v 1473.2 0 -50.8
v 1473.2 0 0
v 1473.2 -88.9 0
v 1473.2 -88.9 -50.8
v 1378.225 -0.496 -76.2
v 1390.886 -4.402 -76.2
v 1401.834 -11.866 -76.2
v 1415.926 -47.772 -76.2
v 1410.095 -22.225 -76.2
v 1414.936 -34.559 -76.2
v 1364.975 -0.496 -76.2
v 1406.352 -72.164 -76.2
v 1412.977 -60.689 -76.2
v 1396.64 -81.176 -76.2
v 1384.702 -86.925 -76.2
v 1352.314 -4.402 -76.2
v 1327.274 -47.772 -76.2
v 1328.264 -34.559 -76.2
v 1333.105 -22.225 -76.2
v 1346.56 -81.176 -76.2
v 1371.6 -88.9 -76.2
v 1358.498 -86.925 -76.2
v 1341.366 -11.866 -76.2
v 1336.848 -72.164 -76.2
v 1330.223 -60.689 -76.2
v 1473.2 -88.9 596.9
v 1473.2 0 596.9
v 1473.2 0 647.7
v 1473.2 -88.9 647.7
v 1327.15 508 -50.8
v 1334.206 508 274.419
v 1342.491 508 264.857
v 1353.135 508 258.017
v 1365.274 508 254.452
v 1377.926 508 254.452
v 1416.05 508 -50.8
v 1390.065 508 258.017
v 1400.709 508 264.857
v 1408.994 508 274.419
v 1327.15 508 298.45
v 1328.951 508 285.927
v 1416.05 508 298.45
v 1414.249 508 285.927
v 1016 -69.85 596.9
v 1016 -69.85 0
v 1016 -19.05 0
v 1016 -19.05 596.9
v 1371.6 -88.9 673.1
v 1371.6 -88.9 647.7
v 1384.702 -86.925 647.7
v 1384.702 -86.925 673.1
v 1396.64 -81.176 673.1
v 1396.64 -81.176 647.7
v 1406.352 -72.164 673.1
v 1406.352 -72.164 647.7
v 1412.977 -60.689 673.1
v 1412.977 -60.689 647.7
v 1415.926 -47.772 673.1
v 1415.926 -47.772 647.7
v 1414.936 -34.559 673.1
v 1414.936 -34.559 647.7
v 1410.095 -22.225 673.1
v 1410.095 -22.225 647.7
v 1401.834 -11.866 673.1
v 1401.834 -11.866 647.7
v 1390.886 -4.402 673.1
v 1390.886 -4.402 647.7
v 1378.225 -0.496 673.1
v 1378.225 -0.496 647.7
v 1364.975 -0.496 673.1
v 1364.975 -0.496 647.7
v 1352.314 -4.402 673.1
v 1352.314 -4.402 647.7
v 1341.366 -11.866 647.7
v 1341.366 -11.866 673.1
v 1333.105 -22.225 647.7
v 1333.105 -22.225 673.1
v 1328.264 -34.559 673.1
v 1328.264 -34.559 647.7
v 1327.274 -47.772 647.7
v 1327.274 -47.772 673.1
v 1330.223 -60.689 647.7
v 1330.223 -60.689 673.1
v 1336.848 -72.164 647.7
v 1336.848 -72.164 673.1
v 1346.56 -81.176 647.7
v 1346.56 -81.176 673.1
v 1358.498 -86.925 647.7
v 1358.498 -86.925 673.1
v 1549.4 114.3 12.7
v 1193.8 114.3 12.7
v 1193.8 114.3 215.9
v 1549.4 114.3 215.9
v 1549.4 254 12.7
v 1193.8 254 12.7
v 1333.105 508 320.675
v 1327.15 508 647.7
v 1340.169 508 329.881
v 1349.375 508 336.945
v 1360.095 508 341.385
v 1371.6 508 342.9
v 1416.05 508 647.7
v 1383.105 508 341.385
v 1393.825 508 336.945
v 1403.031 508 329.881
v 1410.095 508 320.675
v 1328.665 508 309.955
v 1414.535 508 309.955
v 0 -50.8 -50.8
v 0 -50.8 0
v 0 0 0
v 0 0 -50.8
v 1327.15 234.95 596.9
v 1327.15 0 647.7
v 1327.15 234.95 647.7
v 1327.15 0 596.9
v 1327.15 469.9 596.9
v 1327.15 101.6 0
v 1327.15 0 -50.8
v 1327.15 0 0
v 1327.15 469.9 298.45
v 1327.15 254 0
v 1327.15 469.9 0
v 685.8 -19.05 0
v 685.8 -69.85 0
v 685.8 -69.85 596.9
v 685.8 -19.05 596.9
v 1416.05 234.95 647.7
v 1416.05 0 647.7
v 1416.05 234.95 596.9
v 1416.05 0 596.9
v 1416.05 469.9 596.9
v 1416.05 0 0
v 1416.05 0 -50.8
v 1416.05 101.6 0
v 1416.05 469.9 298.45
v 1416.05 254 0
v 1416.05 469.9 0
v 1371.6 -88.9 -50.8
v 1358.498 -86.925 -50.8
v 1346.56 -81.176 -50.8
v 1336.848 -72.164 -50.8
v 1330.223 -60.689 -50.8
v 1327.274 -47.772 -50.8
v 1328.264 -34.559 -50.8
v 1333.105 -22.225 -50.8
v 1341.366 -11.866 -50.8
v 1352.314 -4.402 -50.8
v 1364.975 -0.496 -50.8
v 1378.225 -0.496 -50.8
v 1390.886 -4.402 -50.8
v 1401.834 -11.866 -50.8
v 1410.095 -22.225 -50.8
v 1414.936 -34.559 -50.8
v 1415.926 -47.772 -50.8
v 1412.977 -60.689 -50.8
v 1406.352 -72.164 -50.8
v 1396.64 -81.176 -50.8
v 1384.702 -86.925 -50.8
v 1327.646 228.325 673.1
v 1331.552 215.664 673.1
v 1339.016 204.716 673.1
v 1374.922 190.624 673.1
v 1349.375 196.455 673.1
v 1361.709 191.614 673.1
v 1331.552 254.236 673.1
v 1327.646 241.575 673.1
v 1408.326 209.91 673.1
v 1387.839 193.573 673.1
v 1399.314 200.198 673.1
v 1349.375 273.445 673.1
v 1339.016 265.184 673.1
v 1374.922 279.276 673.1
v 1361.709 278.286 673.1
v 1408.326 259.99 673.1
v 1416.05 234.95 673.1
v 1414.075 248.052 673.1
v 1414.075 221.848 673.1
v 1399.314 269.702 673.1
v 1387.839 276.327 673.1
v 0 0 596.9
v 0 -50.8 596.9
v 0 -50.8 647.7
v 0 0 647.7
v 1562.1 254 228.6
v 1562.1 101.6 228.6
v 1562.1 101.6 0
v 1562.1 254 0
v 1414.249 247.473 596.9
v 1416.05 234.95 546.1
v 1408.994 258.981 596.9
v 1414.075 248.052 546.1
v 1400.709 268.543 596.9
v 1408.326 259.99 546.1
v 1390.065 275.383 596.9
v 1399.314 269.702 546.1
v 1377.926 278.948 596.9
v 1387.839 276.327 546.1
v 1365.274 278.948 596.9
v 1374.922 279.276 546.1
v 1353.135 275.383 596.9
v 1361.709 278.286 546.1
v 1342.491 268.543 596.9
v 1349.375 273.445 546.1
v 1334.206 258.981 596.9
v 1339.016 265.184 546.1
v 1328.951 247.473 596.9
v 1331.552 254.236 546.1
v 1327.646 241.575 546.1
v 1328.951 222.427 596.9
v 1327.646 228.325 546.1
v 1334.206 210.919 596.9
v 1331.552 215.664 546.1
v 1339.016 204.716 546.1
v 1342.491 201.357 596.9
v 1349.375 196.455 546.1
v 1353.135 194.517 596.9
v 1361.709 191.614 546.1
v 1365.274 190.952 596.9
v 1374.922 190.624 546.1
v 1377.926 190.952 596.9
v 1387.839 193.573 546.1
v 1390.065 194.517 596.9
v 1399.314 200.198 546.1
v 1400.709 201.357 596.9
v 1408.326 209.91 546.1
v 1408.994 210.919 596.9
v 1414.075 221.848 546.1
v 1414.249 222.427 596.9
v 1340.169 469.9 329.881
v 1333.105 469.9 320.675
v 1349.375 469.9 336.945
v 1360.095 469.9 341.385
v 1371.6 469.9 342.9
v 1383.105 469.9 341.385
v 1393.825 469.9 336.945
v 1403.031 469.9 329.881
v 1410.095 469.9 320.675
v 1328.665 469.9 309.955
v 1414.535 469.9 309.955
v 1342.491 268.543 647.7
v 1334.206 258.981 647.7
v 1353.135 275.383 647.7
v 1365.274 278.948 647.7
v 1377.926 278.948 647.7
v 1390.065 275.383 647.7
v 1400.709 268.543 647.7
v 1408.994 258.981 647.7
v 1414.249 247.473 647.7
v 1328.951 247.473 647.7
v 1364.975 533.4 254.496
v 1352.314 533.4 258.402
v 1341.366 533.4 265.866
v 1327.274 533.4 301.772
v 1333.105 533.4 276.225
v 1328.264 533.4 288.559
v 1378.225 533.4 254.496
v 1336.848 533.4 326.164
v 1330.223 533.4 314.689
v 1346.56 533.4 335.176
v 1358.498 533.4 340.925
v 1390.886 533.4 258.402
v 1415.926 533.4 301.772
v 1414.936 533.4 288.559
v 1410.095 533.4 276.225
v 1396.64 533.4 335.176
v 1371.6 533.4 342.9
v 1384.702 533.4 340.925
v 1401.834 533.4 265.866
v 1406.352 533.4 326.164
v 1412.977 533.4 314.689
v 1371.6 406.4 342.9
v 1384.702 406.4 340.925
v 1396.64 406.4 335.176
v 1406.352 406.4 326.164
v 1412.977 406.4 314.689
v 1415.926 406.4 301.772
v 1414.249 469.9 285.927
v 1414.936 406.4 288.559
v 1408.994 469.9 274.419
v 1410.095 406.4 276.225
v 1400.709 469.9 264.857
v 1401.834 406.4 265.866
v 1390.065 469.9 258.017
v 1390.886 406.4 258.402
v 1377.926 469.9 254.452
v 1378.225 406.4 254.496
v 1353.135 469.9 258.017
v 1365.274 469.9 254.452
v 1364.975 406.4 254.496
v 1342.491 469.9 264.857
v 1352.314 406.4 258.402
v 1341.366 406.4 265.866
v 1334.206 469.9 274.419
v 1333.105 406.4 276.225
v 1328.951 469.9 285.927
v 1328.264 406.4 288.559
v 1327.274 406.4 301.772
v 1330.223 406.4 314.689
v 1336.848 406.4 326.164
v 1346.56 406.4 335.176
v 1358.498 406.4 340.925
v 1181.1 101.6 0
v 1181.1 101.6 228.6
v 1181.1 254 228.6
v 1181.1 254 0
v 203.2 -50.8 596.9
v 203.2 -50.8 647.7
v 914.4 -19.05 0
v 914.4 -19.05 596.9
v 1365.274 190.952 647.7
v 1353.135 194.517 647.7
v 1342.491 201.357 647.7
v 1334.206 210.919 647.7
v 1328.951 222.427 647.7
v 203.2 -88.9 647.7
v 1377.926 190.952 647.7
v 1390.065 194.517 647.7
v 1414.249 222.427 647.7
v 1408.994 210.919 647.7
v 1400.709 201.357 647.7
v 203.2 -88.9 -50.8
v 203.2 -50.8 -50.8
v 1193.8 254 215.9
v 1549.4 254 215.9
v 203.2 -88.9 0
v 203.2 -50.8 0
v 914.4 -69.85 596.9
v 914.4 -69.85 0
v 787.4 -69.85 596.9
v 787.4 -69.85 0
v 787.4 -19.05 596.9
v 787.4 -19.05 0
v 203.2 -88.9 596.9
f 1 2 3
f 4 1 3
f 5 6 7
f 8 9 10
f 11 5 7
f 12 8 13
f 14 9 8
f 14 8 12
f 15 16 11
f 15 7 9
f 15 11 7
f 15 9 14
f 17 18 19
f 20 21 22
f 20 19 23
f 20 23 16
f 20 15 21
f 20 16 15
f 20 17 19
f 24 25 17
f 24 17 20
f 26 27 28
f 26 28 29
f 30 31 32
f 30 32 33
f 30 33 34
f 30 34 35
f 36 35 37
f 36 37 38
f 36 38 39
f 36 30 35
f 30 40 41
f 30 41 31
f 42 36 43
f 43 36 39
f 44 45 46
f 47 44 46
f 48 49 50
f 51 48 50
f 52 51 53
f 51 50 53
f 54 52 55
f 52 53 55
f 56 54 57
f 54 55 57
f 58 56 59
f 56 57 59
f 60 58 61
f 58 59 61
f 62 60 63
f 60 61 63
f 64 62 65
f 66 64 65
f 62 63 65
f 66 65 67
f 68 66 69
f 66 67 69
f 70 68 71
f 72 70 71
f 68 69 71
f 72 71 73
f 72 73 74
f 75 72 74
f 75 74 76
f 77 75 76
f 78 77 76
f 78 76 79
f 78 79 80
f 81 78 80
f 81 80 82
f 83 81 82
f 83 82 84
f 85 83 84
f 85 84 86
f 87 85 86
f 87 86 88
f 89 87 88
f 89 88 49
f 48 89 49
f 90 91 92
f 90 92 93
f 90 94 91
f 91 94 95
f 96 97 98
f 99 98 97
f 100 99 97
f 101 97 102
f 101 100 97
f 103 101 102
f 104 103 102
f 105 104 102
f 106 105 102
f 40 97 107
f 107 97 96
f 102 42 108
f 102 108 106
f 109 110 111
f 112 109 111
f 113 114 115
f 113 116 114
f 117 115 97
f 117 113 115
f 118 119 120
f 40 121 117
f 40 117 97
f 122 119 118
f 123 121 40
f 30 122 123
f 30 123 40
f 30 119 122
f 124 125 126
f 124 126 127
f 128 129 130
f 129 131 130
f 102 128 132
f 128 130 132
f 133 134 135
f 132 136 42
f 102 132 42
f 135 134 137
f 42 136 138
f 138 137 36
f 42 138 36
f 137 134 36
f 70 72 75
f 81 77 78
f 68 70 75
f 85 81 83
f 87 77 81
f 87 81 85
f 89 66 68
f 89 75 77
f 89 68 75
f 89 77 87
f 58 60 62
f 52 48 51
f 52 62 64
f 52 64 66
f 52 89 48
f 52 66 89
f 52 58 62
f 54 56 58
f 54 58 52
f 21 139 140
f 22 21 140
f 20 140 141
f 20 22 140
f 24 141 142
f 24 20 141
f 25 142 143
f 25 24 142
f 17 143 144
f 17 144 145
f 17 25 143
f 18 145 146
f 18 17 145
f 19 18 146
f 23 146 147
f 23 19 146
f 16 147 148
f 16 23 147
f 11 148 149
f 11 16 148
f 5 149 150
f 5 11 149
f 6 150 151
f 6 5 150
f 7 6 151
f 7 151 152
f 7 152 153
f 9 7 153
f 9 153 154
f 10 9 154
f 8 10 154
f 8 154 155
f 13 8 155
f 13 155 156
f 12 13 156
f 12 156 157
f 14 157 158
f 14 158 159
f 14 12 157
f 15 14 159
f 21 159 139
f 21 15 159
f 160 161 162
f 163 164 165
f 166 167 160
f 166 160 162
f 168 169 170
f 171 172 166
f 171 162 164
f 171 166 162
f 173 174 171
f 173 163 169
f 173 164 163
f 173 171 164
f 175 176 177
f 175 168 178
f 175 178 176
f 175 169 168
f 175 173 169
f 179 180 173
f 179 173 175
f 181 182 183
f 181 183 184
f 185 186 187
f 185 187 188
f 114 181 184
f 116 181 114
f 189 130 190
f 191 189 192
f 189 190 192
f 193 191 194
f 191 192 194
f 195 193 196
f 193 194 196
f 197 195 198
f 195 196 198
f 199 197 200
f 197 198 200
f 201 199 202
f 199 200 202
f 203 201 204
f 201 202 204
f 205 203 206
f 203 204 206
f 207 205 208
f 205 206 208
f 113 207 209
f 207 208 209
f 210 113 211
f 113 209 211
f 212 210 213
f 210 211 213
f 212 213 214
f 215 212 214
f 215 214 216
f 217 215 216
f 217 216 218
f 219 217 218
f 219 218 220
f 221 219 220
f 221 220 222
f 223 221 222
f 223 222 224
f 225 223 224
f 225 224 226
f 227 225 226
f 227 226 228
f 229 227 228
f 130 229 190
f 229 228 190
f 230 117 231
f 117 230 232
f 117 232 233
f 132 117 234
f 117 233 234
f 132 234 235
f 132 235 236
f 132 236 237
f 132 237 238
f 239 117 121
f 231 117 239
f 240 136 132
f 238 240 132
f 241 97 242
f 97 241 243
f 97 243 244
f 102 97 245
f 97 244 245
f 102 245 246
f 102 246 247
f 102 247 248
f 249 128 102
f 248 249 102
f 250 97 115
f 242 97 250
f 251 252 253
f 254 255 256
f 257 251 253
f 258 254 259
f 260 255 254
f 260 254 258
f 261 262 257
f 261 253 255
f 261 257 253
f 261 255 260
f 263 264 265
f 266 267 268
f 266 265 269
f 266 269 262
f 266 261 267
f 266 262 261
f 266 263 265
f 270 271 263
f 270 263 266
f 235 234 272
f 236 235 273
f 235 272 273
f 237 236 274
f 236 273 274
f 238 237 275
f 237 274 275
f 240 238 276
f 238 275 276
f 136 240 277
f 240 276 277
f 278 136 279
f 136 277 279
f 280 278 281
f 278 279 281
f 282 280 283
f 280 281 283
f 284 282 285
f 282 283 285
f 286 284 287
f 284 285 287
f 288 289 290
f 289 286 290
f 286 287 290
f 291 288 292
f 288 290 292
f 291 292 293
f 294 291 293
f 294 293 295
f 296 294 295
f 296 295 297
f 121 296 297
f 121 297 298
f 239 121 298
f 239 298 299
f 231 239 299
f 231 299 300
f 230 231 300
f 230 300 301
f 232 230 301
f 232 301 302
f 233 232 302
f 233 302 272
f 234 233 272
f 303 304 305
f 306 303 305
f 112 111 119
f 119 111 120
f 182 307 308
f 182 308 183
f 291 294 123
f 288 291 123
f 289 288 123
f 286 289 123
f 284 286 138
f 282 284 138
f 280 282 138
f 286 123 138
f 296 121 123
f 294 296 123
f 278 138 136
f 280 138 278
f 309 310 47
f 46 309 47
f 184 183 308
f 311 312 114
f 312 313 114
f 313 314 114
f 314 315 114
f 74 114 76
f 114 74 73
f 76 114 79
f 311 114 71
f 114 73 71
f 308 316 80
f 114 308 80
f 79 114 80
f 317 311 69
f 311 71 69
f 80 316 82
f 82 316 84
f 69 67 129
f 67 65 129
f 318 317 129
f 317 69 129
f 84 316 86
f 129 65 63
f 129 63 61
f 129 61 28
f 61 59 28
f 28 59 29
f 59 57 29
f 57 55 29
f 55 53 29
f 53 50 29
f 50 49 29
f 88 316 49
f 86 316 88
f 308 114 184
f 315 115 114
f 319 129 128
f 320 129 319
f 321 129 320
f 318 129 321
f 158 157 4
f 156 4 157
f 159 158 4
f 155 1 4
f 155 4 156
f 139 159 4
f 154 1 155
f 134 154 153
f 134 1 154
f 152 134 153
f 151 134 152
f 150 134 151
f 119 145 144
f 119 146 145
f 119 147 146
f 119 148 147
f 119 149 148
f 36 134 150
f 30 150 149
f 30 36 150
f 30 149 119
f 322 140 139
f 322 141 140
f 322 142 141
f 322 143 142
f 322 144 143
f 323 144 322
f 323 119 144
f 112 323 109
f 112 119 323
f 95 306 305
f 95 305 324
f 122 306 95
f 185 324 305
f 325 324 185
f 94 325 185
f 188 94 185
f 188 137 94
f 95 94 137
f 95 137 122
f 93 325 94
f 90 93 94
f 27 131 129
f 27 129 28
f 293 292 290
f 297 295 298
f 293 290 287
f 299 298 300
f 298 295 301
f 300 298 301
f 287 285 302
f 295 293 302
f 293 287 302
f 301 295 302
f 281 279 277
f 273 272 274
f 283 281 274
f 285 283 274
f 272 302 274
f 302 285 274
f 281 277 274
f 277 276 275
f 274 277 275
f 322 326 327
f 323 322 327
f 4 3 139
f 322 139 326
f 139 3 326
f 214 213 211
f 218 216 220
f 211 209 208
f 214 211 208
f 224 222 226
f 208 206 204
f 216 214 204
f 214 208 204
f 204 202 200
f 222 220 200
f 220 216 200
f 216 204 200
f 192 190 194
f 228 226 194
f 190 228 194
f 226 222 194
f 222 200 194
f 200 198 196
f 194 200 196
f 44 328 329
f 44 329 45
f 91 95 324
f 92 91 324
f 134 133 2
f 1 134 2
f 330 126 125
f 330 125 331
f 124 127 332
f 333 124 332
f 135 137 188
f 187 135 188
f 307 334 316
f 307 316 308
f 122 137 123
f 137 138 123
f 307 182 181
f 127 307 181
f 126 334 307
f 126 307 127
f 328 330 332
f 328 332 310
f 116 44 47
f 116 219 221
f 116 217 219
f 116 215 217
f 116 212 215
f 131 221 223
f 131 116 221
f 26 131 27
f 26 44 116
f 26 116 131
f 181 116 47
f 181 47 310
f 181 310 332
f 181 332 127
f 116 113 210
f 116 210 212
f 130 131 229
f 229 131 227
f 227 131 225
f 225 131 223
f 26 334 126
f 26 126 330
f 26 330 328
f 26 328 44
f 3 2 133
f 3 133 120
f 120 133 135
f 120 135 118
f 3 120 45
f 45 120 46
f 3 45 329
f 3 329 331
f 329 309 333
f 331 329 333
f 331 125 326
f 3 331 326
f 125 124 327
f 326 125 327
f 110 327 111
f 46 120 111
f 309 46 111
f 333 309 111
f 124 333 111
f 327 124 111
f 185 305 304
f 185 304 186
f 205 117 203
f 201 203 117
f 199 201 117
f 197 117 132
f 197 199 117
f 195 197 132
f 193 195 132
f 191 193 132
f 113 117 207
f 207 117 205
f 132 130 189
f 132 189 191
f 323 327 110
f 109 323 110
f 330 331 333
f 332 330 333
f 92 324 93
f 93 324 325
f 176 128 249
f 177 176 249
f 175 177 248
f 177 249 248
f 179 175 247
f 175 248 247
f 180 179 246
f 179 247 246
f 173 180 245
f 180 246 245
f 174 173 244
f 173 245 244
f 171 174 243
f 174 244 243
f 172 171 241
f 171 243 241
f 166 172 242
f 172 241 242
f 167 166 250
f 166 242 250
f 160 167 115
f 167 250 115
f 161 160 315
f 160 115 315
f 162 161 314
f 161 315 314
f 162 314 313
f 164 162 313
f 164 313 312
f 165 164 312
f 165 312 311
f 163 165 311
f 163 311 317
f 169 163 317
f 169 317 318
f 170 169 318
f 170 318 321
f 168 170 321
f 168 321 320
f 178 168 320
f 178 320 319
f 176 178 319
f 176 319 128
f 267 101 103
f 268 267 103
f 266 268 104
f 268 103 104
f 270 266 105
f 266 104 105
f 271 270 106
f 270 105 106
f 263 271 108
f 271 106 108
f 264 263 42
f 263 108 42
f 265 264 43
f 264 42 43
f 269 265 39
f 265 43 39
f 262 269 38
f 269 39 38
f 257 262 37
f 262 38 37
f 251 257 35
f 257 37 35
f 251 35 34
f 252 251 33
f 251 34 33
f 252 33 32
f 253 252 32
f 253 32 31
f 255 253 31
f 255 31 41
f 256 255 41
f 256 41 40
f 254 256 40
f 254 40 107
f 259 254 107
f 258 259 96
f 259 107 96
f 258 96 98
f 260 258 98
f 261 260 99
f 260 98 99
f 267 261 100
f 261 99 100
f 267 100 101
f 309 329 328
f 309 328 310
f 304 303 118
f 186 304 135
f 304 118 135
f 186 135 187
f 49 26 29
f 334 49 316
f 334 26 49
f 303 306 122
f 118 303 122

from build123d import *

# Parameters (mm, degrees)
BOSS_EXTRUDE1_DEPTH      = 50.8
BOSS_EXTRUDE2_DEPTH      = 50.8
SKETCH5_W                = 101.6
SKETCH5_H                = 50.8
BOSS_EXTRUDE3_DEPTH      = 596.9
SKETCH6_R                = 44.45
BOSS_EXTRUDE4_DEPTH      = 25.4
SKETCH7_W                = 88.9
SKETCH7_H                = 50.8
BOSS_EXTRUDE5_DEPTH      = 508
SKETCH8_W                = 88.9
SKETCH8_H                = 38.1
BOSS_EXTRUDE6_DEPTH      = 596.9
SKETCH10_W               = 381
SKETCH10_H               = 152.4
BOSS_EXTRUDE7_DEPTH      = 228.6
CUT_EXTRUDE1_DEPTH       = 139.7
BOSS_EXTRUDE8_DEPTH      = 25.4
BOSS_EXTRUDE8_DEPTH_BACK = 101.6
SKETCH13_R               = 44.45
BOSS_EXTRUDE9_DEPTH      = 25.4
BOSS_EXTRUDE9_DEPTH_BACK = 101.6
SKETCH14_R               = 44.45
BOSS_EXTRUDE10_START     = 25.4
SKETCH15_R               = 44.45
BOSS_EXTRUDE10_DEPTH     = 25.4


with BuildPart() as part:
    # Sketch1 → Boss-Extrude1 (new body)
    with BuildSketch(Plane.XY):
        Polygon((0, 0), (1473.2, 0), (1473.2, -88.9), (203.2, -88.9), (203.2, -50.8), (0, -50.8), align=None)
    extrude(amount=-BOSS_EXTRUDE1_DEPTH)



with BuildPart() as body_2:
    # Sketch4 → Boss-Extrude2 (new body)
    with BuildSketch(Plane.XY.offset(596.9)):
        Polygon((0, 0), (1473.2, 0), (1473.2, -88.9), (203.2, -88.9), (203.2, -50.8), (0, -50.8), align=None)
    extrude(amount=BOSS_EXTRUDE2_DEPTH)


with BuildPart() as part_1:
    add(part.part)

    add(body_2.part)  # Boss-Extrude3 merges body 2
    # Sketch5 → Boss-Extrude3 (add)
    with BuildSketch(Plane.XY):
        with Locations((965.2, -44.45)):
            Rectangle(SKETCH5_W, SKETCH5_H)
        with Locations((736.6, -44.45)):
            Rectangle(SKETCH5_W, SKETCH5_H)
    extrude(amount=BOSS_EXTRUDE3_DEPTH)

    # Sketch6 → Boss-Extrude4 (add)
    with BuildSketch(Plane.XY.offset(647.7)):
        with Locations(Location((1371.6, -44.45, 0), (0, 0, 270))):
            Circle(SKETCH6_R)
    extrude(amount=BOSS_EXTRUDE4_DEPTH)

    # Sketch7 → Boss-Extrude5 (add)
    with BuildSketch(Plane(origin=(0, 0, 0), x_dir=(1, 0, 0), z_dir=(0, 1, 0))):
        with Locations((1371.6, -622.3)):
            Rectangle(SKETCH7_W, SKETCH7_H)
        with Locations((1371.6, 25.4)):
            Rectangle(SKETCH7_W, SKETCH7_H)
    extrude(amount=BOSS_EXTRUDE5_DEPTH)

    # Sketch8 → Boss-Extrude6 (add)
    with BuildSketch(Plane.XY):
        with Locations((1371.6, 488.95)):
            Rectangle(SKETCH8_W, SKETCH8_H)
    extrude(amount=BOSS_EXTRUDE6_DEPTH)

    # Sketch10 → Boss-Extrude7 (add)
    with BuildSketch(Plane.XY):
        with Locations((1371.6, 177.8)):
            Rectangle(SKETCH10_W, SKETCH10_H)
    extrude(amount=BOSS_EXTRUDE7_DEPTH)

    # Sketch11 → Cut-Extrude1 (cut)
    with BuildSketch(Plane(origin=(0, 254, 0), x_dir=(1, 0, 0), z_dir=(0, 1, 0))):
        Polygon((1549.4, -12.7), (1416.05, -12.7), (1327.15, -12.7), (1193.8, -12.7), (1193.8, -215.9), (1549.4, -215.9), align=None)
    extrude(amount=-CUT_EXTRUDE1_DEPTH, mode=Mode.SUBTRACT)

    # Sketch13 → Boss-Extrude8 (add, two sides: drawn at the far end of the back side and taken through both)
    with BuildSketch(Plane(origin=(0, 508, 0), x_dir=(1, 0, 0), z_dir=(0, 1, 0)).offset(-BOSS_EXTRUDE8_DEPTH_BACK)):
        with Locations(Location((1371.6, -298.45, 0), (0, 0, 270))):
            Circle(SKETCH13_R)
    extrude(amount=BOSS_EXTRUDE8_DEPTH + BOSS_EXTRUDE8_DEPTH_BACK)

    # Sketch14 → Boss-Extrude9 (add, two sides: drawn at the far end of the back side and taken through both)
    with BuildSketch(Plane.XY.offset(647.7).offset(-BOSS_EXTRUDE9_DEPTH_BACK)):
        with Locations((1371.6, 234.95)):
            Circle(SKETCH14_R)
    extrude(amount=BOSS_EXTRUDE9_DEPTH + BOSS_EXTRUDE9_DEPTH_BACK)

    # Sketch15 → Boss-Extrude10 (add)
    with BuildSketch(Plane(origin=(0, 0, -50.8), x_dir=(-1, 0, 0), z_dir=(0, 0, -1)).offset(BOSS_EXTRUDE10_START)):
        with Locations(Location((-1371.6, -44.45, 0), (0, 0, 270))):
            Circle(SKETCH15_R)
    extrude(amount=-BOSS_EXTRUDE10_DEPTH)


solid = part_1.part
